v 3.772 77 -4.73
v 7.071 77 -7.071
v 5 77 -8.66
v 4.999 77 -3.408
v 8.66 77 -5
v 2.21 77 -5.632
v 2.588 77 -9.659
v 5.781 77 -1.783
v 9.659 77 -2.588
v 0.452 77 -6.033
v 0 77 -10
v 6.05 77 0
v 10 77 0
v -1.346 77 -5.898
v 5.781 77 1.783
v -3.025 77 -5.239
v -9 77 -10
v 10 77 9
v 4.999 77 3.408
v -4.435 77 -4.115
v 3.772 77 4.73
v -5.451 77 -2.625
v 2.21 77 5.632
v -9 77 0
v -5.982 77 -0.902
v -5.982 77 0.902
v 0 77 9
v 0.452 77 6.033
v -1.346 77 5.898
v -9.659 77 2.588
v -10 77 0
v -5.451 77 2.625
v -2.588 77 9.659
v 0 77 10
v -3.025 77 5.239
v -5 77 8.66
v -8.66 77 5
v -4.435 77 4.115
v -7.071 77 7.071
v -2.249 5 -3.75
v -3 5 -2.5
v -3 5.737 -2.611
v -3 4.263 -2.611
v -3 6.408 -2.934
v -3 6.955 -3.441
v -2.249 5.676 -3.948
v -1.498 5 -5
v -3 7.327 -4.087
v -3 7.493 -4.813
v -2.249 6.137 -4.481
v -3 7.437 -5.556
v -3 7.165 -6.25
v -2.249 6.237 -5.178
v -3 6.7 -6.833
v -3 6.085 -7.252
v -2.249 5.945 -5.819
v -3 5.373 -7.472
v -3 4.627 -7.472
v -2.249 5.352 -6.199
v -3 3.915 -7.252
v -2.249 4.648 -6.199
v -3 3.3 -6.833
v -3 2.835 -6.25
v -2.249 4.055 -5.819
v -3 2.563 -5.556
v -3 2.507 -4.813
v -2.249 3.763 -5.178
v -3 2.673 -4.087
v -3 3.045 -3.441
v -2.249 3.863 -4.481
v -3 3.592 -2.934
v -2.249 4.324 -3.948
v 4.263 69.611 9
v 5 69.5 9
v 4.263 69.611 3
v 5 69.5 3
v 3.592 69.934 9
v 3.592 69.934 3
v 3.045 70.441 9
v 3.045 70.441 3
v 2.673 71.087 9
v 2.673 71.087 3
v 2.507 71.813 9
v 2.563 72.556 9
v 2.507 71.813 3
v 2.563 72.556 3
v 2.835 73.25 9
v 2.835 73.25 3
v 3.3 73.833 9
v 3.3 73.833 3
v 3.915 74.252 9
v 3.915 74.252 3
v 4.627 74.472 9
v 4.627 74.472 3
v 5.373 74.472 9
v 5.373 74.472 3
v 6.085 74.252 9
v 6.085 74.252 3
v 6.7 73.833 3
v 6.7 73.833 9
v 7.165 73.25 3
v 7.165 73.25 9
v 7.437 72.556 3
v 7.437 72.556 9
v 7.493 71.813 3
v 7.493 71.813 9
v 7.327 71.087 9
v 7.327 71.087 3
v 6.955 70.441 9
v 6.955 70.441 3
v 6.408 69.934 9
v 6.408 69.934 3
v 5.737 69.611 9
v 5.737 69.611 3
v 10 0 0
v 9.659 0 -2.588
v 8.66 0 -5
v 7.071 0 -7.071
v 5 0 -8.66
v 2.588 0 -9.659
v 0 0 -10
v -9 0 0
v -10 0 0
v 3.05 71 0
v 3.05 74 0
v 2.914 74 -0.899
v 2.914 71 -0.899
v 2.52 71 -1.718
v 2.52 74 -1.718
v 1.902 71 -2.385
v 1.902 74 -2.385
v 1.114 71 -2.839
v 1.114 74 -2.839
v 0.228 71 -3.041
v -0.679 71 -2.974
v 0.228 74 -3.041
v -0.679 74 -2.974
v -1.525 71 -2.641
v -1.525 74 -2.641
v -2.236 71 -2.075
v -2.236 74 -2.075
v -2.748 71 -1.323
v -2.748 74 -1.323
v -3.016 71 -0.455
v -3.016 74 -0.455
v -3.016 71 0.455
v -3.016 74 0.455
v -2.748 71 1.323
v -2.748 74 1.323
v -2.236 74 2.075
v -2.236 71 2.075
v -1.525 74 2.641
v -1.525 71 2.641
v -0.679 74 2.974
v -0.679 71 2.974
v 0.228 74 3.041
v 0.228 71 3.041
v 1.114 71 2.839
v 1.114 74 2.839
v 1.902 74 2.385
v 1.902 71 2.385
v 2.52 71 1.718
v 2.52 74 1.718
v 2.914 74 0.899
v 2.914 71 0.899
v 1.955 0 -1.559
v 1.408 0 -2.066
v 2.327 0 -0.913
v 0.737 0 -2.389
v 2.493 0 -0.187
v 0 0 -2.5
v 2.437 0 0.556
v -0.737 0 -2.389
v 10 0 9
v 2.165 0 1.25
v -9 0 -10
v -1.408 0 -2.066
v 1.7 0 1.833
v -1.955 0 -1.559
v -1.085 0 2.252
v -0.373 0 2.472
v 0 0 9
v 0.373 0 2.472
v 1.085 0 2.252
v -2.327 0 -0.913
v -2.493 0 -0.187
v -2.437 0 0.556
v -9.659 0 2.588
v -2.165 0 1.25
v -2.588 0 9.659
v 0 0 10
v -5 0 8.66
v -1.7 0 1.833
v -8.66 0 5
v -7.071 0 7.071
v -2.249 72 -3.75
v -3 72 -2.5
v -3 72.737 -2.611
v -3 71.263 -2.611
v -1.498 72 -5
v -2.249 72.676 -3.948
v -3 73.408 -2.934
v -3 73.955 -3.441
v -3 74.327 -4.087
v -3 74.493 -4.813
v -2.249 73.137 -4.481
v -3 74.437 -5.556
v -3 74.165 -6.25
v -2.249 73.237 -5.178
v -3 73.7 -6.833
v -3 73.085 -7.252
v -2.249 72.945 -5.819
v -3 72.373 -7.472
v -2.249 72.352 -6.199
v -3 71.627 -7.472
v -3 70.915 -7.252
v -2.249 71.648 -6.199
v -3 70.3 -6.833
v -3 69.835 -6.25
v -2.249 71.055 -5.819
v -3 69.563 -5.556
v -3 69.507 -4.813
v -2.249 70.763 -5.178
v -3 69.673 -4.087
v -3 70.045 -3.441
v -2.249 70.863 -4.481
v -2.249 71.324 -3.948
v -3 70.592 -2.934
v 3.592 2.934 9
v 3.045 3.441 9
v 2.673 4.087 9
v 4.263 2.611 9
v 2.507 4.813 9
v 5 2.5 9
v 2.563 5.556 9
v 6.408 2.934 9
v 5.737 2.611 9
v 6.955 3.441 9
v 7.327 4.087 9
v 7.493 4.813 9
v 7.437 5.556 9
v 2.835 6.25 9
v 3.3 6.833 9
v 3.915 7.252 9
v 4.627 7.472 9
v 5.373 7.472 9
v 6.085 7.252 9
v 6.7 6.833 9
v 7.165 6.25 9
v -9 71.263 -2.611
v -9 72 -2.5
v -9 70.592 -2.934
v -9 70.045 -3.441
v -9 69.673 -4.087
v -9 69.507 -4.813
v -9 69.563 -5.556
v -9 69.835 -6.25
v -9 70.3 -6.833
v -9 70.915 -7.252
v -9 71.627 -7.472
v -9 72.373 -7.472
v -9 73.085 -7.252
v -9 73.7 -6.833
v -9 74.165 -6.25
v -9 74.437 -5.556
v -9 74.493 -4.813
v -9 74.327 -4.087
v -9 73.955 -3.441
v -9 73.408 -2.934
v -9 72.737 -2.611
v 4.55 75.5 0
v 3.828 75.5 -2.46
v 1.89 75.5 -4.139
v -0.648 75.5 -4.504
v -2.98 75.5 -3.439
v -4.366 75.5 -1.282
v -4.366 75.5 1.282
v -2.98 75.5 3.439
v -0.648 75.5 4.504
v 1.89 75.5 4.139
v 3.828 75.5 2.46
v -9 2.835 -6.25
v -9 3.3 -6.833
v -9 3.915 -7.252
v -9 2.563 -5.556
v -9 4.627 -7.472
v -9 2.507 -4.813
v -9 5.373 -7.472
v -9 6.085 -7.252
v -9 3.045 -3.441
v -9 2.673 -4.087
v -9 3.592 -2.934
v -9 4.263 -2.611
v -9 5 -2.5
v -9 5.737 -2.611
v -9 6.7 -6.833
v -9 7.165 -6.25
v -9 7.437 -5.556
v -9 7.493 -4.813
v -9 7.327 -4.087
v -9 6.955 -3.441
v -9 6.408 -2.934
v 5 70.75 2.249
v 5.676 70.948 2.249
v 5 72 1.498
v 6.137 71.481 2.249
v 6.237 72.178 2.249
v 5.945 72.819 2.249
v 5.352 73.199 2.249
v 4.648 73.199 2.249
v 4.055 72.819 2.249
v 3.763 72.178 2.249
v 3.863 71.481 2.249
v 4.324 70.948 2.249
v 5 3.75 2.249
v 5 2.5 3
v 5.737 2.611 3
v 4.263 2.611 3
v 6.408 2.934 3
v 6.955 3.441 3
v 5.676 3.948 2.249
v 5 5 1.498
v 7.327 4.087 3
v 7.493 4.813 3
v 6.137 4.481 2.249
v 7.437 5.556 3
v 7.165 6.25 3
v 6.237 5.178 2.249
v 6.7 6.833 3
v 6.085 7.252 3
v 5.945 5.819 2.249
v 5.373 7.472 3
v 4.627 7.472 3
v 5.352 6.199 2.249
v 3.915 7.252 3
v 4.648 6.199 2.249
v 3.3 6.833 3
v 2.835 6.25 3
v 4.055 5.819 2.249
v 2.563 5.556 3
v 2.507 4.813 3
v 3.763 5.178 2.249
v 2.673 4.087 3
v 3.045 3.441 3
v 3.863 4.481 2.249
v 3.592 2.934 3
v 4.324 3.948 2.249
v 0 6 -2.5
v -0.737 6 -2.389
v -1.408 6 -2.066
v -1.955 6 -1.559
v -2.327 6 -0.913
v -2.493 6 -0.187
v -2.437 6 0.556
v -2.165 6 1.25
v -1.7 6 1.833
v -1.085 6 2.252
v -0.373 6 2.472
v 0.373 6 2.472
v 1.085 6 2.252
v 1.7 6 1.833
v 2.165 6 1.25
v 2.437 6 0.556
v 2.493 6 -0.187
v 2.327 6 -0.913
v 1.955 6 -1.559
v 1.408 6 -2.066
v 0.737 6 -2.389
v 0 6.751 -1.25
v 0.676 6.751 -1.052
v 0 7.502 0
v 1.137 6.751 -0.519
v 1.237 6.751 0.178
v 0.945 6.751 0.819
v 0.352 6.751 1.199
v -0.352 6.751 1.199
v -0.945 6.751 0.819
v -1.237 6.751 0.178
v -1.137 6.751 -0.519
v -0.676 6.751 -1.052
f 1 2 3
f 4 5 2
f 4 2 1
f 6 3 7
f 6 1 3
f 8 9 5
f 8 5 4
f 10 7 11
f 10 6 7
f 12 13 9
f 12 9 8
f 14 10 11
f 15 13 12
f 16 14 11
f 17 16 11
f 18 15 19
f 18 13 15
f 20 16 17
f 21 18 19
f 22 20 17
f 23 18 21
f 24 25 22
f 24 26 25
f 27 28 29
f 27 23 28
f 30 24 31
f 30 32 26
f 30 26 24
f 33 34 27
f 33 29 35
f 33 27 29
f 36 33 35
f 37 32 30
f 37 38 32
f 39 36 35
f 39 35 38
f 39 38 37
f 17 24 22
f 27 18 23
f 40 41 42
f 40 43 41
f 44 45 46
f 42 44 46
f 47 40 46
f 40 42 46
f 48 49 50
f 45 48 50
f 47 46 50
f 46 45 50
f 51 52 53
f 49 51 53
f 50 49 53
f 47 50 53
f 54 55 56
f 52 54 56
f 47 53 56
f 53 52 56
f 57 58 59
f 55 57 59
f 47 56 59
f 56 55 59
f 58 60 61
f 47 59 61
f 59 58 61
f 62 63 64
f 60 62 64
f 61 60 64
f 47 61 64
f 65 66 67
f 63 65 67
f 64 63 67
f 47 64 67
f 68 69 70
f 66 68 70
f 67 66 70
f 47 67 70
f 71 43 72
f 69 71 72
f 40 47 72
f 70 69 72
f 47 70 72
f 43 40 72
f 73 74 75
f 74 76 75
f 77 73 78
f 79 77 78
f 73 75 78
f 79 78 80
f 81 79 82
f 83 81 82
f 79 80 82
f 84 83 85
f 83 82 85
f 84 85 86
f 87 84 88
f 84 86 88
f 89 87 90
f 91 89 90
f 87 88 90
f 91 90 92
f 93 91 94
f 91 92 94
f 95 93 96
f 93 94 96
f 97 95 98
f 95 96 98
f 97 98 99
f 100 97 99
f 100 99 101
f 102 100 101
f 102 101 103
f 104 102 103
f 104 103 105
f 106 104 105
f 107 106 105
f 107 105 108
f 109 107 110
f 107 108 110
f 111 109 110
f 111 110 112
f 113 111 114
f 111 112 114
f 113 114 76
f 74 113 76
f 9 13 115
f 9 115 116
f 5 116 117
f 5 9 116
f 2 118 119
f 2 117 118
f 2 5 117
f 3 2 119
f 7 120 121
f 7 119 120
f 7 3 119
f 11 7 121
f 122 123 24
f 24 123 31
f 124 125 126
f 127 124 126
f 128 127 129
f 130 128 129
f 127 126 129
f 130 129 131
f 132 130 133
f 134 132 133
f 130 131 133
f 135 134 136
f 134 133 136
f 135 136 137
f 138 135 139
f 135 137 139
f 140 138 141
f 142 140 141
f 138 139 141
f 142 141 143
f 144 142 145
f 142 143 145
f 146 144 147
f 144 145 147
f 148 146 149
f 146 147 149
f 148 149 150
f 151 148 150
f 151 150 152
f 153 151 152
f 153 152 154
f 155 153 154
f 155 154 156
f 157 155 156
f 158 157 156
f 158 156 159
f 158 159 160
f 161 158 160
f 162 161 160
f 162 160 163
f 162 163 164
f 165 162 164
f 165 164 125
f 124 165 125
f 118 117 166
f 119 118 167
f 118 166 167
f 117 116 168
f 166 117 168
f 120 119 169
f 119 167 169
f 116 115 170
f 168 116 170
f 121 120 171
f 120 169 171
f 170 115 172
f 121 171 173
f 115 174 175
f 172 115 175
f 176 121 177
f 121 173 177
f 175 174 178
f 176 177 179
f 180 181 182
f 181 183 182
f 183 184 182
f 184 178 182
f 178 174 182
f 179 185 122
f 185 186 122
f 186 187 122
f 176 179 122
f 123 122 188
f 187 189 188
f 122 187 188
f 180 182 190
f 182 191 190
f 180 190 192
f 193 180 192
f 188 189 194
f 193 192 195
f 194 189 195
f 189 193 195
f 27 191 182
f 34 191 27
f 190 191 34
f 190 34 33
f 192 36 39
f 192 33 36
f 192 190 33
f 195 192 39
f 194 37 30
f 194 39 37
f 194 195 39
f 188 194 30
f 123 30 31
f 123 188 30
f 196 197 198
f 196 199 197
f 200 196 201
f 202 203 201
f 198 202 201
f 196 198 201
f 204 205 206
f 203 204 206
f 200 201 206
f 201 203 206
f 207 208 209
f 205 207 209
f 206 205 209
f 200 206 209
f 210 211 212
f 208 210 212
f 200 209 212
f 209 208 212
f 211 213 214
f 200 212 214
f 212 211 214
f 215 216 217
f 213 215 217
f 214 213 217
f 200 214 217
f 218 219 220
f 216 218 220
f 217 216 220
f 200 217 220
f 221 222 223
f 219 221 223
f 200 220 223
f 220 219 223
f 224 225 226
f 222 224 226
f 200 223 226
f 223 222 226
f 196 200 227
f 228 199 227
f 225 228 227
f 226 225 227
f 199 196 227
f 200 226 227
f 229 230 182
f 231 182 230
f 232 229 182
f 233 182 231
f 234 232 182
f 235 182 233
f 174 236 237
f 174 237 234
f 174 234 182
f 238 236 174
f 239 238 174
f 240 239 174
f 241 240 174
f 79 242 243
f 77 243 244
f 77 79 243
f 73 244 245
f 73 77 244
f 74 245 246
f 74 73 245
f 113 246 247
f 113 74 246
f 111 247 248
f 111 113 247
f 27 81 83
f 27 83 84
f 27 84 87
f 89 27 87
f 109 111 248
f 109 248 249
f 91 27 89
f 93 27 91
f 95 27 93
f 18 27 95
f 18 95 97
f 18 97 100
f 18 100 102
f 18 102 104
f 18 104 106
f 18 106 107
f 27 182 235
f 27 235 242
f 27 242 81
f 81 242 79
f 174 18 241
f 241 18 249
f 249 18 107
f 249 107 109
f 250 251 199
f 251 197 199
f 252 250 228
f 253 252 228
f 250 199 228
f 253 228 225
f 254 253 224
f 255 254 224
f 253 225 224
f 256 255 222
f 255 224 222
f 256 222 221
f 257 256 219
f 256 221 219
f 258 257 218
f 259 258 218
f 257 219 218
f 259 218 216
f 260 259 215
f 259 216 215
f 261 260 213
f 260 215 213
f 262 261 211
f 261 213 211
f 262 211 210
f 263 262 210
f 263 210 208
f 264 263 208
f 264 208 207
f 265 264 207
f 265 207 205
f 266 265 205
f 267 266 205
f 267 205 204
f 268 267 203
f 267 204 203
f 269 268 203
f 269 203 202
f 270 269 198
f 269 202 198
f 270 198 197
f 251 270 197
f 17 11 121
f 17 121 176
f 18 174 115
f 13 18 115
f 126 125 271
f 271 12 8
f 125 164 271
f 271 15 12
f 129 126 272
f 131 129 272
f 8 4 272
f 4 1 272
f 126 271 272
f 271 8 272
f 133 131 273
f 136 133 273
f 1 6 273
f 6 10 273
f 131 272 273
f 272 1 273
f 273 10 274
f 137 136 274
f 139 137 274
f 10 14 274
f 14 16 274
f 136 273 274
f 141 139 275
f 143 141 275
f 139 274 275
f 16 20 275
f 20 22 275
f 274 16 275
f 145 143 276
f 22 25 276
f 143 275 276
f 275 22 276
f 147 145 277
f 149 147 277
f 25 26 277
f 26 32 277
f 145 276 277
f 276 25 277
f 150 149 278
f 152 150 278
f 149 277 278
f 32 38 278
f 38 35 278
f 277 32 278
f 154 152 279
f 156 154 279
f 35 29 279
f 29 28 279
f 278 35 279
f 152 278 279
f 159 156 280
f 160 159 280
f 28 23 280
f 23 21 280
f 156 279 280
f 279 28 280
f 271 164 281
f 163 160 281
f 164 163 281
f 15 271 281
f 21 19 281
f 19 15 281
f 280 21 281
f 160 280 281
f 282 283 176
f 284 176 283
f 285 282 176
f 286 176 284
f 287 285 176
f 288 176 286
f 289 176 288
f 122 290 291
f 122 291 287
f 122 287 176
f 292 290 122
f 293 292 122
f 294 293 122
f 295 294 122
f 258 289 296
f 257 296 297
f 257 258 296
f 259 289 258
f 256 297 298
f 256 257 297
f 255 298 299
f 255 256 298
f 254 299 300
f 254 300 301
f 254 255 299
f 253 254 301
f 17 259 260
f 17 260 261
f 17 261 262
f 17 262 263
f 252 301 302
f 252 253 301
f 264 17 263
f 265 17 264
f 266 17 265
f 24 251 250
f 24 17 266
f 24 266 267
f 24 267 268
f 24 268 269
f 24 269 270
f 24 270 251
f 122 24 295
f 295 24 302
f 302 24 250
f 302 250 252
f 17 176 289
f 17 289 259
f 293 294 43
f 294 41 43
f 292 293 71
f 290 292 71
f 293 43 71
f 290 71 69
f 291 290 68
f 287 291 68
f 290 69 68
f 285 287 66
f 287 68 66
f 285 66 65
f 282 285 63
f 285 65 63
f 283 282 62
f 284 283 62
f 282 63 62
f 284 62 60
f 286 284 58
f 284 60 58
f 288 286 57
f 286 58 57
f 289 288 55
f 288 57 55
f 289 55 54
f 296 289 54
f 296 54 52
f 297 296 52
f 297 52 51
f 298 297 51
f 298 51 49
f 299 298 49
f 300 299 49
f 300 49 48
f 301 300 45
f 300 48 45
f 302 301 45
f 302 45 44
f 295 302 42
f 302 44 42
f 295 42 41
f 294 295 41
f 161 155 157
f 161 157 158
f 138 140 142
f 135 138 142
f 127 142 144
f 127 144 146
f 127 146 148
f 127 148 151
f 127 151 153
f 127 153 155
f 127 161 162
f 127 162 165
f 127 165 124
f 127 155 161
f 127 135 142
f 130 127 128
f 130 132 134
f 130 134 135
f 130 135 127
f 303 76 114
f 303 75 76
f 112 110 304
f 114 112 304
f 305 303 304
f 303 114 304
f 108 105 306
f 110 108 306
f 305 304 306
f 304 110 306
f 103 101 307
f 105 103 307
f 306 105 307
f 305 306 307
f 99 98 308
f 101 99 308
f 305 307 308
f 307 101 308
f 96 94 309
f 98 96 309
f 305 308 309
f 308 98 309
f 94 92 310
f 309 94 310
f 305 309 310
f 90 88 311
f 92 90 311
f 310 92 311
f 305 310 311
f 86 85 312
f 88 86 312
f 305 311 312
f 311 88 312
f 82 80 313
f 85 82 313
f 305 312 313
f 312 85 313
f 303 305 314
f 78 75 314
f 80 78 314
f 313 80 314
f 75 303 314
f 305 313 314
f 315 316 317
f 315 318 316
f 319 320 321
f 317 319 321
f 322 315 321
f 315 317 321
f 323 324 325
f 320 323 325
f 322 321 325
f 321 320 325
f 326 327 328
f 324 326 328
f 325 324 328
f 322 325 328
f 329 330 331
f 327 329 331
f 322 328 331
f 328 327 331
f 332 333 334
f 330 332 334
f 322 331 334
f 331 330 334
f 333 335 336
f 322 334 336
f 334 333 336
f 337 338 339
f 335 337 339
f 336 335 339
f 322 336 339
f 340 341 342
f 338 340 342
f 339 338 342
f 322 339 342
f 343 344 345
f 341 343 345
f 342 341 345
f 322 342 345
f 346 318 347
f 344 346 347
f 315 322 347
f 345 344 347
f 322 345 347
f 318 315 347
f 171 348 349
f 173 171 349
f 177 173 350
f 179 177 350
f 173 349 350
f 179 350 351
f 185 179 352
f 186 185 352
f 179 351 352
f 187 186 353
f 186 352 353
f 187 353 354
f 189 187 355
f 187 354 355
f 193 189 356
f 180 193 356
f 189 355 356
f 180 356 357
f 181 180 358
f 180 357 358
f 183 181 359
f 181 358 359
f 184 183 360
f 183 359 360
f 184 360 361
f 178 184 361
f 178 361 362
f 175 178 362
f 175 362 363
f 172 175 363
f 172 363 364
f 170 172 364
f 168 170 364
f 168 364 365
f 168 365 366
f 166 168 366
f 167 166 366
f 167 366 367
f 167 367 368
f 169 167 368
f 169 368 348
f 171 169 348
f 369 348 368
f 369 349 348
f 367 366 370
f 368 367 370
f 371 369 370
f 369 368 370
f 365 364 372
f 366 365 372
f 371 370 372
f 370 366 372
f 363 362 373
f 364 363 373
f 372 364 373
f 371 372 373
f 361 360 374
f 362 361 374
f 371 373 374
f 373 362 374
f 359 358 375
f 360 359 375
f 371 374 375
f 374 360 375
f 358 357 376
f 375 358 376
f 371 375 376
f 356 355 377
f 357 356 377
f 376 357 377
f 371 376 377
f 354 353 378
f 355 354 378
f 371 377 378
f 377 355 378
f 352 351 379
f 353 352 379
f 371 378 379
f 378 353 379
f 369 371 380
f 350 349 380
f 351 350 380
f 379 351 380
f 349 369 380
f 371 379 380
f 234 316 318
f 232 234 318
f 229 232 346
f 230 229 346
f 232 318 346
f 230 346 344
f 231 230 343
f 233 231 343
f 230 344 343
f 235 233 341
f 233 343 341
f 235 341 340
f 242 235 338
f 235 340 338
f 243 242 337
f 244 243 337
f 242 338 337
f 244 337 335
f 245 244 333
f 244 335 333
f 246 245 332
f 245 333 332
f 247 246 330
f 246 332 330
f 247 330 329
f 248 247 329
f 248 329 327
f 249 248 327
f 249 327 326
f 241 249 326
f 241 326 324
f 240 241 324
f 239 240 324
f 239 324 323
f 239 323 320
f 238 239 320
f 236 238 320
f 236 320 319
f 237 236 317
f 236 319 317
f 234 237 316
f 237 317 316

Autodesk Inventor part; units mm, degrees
ref_plane "YZ Plane" through (0, 0, 0) normal (1, 0, 0) x (0, 1, 0)
ref_plane "XZ Plane" through (0, 0, 0) normal (0, 1, 0) x (-1, 0, 0)
ref_plane "XY Plane" through (0, 0, 0) normal (0, 0, 1) x (1, 0, 0)
sketch "スケッチ1" plane through (0, 0, 0) normal (0, 1, 0) x (-1, 0, 0)
  circle A0 centre (0, 0) radius 10
  line L0 (0, 10) -> (-10, 10)
  line L1 (-10, 10) -> (-10, -10)
  line L2 (-10, -10) -> (10, -10)
  line L3 (10, -10) -> (10, 0)
  dimension "d0" = 20
  dimension "d1" = 10
  dimension "d2" = 10
extrude "押し出し1" add sketch "スケッチ1" along normal blind 77
sketch "スケッチ2" plane through (0, 0, 10) normal (0, 0, 1) x (1, 0, 0)
  line L0 (0, 0) -> (0, 77) projected
  line L1 (0, 77) -> (10, 77) projected
  line L2 (10, 77) -> (10, 0) projected
  line L3 (10, 0) -> (0, 0) projected
extrude "押し出し2" cut sketch "スケッチ2" against normal blind 1
sketch "スケッチ3" plane through (-10, 0, -10) normal (-1, 0, 0) x (0, 0, 1)
  line L0 (0, 77) -> (10, 77) projected
  line L1 (10, 0) -> (10, 77) projected
  line L2 (10, 0) -> (0, 0) projected
  line L3 (0, 0) -> (0, 77) projected
extrude "押し出し3" cut sketch "スケッチ3" against normal blind 1
sketch "スケッチ4" plane through (0, 0, 9) normal (0, 0, 1) x (1, 0, 0)
  line L0 (0, 77) -> (10, 77) projected
  line L1 (10, 77) -> (10, 0) projected
  line L2 (10, 0) -> (0, 0) projected
  point P0 (5, 72)
  point P1 (5, 5)
  dimension "d9" = 5
  dimension "d10" = 5
  dimension "d11" = 5
hole "穴1" at (5, 72, 9) at (5, 5, 9) direction (0, 0, -1) diameter 5 depth 6 tip angle 118
sketch "スケッチ5" plane through (0, 0, 0) normal (0, 1, 0) x (1, 0, 0)
  point P0 (0, 0)
hole "穴2" at (0, 0, 0) direction (0, 1, 0) diameter 5 depth 6 tip angle 118
sketch "スケッチ6" plane through (-9, 0, -10) normal (-1, 0, 0) x (0, 0, 1)
  line L0 (0, 0) -> (0, 77) projected
  line L1 (0, 77) -> (10, 77) projected
  line L2 (10, 0) -> (0, 0) projected
  point P0 (5, 72)
  point P1 (5, 5)
  dimension "d26" = 5
  dimension "d27" = 5
  dimension "d28" = 5
  dimension "d29" = 5
hole "穴3" at (-9, 72, -5) at (-9, 5, -5) direction (1, 0, 0) diameter 5 depth 6 tip angle 118
sketch "スケッチ7" plane through (0, 77, 0) normal (0, 1, 0) x (1, 0, 0)
  circle A0 centre (0, 0) radius 3.05
  dimension "d37" = 6.1
extrude "押し出し4" cut sketch "スケッチ7" against normal blind 6
chamfer "面取り1" distance 3 angle 45 1 edges at (-3.05, 77, 0)
fillet "フィレット1" radius 10 1 edges at (10, 38.5, -10)
equation "\"d11\" = d9"
properties part number "base6" material "ABS プラスチック"
